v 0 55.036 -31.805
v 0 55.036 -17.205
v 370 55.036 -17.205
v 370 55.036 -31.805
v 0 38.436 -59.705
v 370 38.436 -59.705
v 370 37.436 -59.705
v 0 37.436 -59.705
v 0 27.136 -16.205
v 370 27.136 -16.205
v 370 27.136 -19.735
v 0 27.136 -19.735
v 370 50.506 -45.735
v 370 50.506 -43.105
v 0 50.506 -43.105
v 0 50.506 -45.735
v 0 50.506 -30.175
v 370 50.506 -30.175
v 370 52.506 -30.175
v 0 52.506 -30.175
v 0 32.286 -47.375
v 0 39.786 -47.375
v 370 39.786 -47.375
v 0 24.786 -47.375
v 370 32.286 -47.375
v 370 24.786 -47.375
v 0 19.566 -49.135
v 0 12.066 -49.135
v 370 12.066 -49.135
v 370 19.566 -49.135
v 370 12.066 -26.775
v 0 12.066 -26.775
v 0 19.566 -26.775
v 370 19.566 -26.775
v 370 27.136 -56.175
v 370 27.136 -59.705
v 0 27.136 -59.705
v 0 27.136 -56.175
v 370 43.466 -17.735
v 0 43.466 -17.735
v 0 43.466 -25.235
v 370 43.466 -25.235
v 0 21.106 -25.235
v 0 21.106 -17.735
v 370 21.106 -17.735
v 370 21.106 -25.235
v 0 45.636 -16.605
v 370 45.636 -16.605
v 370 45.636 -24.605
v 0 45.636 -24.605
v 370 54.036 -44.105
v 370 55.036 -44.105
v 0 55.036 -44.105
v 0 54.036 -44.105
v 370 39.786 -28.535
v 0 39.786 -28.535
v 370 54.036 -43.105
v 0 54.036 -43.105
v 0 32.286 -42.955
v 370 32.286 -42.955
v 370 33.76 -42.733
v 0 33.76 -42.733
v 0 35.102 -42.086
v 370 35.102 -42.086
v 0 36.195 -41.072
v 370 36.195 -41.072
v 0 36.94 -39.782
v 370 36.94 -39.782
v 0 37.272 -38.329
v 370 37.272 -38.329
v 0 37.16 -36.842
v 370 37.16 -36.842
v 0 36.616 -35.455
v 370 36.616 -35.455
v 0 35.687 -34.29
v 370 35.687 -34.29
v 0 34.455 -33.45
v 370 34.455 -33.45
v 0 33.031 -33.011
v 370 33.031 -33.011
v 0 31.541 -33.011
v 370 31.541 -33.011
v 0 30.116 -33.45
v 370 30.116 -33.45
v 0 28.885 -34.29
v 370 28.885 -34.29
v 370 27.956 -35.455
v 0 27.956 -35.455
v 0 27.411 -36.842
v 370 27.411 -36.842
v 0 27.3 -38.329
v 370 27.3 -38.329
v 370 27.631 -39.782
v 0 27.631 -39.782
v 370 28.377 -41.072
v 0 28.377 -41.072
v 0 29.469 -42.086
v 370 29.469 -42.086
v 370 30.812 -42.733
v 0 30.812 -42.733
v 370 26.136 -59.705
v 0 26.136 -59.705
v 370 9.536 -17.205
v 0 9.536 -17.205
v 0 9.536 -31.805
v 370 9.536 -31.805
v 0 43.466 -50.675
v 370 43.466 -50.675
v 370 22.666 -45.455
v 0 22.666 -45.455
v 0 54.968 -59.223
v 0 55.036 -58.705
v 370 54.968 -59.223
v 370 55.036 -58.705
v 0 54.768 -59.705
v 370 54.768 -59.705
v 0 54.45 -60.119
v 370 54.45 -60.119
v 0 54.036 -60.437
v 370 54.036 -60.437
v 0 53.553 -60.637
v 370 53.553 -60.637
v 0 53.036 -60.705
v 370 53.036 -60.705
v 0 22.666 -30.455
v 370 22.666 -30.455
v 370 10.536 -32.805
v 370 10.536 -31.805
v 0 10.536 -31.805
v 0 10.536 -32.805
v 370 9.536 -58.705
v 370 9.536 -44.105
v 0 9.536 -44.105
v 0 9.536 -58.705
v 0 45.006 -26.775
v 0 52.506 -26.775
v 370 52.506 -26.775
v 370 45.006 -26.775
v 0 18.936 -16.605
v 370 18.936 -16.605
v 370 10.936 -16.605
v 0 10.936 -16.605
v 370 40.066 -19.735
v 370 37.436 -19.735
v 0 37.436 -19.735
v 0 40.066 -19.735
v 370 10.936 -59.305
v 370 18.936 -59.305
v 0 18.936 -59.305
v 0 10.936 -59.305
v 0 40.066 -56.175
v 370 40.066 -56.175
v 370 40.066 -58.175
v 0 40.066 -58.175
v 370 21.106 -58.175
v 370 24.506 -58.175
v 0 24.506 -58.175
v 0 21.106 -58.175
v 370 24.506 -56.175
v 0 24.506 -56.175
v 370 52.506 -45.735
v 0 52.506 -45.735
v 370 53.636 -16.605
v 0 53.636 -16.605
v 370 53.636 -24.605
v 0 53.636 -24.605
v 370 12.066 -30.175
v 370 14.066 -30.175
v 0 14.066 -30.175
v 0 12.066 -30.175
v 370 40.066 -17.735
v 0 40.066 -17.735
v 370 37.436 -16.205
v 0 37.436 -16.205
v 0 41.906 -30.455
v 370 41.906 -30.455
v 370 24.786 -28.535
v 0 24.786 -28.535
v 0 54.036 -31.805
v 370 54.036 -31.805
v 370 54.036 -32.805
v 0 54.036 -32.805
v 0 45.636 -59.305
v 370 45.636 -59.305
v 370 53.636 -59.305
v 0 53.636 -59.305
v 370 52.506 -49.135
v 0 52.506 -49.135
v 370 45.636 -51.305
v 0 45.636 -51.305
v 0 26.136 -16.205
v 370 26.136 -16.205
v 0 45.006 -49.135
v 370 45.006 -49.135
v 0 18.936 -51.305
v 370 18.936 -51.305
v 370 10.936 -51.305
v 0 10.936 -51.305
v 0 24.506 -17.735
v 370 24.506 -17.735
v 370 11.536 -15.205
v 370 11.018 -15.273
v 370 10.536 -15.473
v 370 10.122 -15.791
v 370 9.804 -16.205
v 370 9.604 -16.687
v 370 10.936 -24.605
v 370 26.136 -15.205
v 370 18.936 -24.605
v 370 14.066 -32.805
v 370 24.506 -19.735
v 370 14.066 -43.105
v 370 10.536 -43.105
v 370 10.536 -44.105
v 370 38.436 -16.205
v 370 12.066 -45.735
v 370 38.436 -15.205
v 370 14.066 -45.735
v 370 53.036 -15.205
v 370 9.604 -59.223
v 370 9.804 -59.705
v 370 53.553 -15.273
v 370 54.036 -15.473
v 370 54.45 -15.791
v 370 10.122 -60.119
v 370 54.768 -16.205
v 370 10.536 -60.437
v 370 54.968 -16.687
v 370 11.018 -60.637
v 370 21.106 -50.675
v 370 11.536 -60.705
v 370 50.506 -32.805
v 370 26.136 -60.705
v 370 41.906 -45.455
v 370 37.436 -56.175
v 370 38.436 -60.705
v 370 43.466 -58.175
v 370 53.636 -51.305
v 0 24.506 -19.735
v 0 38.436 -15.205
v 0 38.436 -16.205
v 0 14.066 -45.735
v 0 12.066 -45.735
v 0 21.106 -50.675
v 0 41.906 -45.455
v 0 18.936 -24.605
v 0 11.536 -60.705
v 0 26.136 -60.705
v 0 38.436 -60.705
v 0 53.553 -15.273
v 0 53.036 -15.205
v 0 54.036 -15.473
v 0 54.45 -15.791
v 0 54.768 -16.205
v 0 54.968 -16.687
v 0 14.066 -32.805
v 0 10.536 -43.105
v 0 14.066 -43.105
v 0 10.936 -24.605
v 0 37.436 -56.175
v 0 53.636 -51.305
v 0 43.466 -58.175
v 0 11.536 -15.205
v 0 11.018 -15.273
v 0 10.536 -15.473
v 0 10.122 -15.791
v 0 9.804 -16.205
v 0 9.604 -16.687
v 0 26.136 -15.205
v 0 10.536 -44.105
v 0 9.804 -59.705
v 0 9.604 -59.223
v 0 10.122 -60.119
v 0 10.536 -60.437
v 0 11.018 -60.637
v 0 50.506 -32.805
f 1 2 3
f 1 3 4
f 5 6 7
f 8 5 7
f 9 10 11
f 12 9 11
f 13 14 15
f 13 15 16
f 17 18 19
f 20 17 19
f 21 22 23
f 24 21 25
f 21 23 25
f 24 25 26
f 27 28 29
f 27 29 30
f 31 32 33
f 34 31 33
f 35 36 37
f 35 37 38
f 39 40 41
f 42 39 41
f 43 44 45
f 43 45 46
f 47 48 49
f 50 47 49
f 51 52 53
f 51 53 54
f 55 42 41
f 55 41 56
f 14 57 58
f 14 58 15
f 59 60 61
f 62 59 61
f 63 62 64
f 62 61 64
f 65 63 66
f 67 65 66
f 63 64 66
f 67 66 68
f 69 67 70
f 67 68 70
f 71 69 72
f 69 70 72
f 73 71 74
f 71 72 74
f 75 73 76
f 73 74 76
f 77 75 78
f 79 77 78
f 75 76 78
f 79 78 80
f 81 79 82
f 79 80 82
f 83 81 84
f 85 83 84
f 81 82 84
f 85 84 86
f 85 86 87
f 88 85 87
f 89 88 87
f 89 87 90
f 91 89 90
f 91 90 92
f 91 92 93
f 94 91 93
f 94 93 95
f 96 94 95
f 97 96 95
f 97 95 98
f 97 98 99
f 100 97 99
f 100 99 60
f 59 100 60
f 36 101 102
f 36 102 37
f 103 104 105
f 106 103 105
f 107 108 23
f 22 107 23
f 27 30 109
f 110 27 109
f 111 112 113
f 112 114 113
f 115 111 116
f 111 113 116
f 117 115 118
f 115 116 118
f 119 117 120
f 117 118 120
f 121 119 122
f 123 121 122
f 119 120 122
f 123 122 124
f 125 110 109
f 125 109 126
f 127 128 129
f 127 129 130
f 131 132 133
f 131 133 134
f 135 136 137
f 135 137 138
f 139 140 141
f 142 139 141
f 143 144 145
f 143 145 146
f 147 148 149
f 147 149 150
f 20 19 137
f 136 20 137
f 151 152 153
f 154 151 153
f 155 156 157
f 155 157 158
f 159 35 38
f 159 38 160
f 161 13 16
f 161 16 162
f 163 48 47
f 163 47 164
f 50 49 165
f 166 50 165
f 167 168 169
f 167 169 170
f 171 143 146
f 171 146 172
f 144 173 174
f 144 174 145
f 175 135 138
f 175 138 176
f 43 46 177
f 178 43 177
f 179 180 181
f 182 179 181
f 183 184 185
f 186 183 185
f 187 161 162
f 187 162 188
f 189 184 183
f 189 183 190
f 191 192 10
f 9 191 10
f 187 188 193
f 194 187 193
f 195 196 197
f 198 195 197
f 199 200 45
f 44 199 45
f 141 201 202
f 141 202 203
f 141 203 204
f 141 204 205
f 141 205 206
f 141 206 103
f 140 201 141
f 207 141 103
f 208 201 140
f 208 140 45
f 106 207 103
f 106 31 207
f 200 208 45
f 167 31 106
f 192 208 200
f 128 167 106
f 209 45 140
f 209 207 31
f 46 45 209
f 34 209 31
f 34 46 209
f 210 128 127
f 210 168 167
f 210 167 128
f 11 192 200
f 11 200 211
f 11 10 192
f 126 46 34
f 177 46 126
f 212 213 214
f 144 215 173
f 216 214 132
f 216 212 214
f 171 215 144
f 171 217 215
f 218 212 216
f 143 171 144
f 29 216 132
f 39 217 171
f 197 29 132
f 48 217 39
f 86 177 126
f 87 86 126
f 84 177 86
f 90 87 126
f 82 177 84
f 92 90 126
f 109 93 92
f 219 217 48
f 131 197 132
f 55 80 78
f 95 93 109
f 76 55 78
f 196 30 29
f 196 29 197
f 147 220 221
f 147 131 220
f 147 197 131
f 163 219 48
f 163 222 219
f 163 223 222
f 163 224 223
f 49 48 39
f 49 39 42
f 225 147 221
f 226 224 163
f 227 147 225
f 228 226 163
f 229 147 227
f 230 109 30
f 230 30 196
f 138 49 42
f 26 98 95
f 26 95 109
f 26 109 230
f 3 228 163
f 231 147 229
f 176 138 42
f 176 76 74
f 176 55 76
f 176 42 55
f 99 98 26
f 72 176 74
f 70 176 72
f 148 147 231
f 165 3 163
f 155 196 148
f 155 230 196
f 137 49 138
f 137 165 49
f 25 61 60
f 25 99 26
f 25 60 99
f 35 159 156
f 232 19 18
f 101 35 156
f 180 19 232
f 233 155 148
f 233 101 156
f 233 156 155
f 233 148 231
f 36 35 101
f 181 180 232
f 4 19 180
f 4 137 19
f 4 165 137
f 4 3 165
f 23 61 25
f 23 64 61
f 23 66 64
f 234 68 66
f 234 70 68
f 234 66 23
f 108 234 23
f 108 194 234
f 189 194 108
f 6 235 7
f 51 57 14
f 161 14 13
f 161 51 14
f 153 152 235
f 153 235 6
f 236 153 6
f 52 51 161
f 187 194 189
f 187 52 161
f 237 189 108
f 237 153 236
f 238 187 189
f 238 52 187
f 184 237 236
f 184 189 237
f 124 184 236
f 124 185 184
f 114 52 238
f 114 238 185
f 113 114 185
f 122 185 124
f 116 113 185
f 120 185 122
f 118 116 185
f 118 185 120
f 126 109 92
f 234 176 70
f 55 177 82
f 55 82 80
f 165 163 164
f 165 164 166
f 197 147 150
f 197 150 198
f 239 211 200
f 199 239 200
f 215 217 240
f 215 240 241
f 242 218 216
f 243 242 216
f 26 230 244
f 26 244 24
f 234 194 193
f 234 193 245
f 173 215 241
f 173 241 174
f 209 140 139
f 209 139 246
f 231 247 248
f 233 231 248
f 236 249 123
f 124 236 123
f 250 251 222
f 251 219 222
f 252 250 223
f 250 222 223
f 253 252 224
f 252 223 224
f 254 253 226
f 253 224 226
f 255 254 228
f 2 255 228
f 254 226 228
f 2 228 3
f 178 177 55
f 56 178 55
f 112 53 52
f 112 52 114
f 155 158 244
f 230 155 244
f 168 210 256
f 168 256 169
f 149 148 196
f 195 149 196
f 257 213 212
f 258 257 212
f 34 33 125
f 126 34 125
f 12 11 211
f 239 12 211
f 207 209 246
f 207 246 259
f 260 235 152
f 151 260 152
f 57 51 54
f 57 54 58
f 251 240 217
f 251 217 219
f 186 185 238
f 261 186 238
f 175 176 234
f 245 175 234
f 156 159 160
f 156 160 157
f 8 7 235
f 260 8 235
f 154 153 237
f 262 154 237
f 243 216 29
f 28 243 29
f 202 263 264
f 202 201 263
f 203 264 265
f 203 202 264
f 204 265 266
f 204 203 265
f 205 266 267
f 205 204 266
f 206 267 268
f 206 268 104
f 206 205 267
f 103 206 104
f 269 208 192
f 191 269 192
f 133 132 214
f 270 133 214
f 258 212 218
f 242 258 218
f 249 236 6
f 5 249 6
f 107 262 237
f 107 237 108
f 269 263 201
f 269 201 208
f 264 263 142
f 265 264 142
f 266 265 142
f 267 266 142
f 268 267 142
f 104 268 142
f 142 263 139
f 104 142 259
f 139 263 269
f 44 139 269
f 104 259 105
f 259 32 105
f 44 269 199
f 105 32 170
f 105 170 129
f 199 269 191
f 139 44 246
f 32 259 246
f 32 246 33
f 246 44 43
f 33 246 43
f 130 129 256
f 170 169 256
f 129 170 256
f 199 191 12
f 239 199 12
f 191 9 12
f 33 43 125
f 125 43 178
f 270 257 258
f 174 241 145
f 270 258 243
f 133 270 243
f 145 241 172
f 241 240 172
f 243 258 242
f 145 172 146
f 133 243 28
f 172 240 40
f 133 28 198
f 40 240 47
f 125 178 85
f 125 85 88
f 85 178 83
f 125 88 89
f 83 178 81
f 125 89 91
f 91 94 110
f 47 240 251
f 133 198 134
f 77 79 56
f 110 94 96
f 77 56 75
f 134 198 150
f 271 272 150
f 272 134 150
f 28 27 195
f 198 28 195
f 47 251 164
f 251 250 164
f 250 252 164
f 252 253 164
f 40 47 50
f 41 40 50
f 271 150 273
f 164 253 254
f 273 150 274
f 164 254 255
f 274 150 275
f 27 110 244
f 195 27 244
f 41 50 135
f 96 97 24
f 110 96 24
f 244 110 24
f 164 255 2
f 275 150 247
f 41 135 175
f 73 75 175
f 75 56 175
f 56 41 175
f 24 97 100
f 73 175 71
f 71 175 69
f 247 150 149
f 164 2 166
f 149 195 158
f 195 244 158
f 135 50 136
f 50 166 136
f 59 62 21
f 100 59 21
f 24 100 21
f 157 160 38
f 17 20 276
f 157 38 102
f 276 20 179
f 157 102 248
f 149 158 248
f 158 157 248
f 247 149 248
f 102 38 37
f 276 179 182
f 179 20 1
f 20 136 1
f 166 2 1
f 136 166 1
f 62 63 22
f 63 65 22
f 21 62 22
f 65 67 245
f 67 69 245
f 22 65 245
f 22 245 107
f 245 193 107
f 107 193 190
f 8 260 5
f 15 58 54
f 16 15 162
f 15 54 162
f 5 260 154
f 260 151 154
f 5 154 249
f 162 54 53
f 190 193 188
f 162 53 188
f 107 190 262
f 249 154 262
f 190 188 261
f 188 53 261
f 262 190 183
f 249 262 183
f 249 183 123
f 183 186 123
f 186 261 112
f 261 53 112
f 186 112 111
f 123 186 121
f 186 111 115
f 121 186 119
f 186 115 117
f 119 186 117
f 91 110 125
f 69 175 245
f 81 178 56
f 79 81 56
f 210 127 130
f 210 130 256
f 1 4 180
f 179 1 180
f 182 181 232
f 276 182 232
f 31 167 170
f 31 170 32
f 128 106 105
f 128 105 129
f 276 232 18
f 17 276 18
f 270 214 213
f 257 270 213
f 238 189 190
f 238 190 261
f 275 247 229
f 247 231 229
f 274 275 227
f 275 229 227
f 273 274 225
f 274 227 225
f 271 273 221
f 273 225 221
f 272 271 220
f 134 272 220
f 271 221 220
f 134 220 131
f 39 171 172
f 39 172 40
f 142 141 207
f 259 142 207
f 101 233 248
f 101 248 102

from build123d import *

# Parameters (mm, degrees)
SKETCH_1_W               = 45.5
SKETCH_1_H               = 45.5
EXTRUDE_1_DEPTH          = 370
CUT_EXTRUDE_1_REACH      = 380.964
SKETCH_2_W               = 8
SKETCH_2_H               = 8
MIRROR_2_COPY_1_REACH    = 380.964
MIRROR_2_COPY_1_SKETCH_W = 8
MIRROR_2_COPY_1_SKETCH_H = 8
CUT_EXTRUDE_2_REACH      = 380.964
MIRROR_4_COPY_1_REACH    = 380.964
FILLET_1_R               = 2
CUT_EXTRUDE_4_REACH      = 380.964
SKETCH_6_R               = 5


with BuildPart() as part:
    # 草图1 → 凸台-拉伸1 (new body)
    with BuildSketch(Plane(origin=(0, 0, 0), x_dir=(0, 0, -1), z_dir=(1, 0, 0))):
        with Locations((37.954960836, 32.285758607)):
            Rectangle(SKETCH_1_W, SKETCH_1_H)
    extrude(amount=EXTRUDE_1_DEPTH)

    # 草图2 → 切除-拉伸1 (cut, up to next)
    with BuildSketch(Plane(origin=(370, 0, 0), x_dir=(0, 0, -1), z_dir=(1, 0, 0)), mode=Mode.PRIVATE) as cut_extrude_1_sk1:
        Polygon((31.804960836, 55.035758607), (31.804960836, 54.035758607), (32.804960836, 54.035758607), (32.804960836, 50.505758607), (30.174960836, 50.505758607), (30.174960836, 52.505758607), (26.774960836, 52.505758607), (26.774960836, 45.005758607), (30.454960836, 41.905758607), (37.954960836, 41.905758607), (37.954960836, 55.035758607), align=None)
    cut_extrude_1_tool1 = extrude(cut_extrude_1_sk1.sketch, amount=-CUT_EXTRUDE_1_REACH, mode=Mode.PRIVATE) & part.part
    # 草图2 → 切除-拉伸1 (cut, up to next)
    with BuildSketch(Plane(origin=(370, 0, 0), x_dir=(0, 0, -1), z_dir=(1, 0, 0)), mode=Mode.PRIVATE) as cut_extrude_1_sk2:
        with Locations((20.604960836, 49.635758607)):
            Rectangle(SKETCH_2_W, SKETCH_2_H)
    cut_extrude_1_tool2 = extrude(cut_extrude_1_sk2.sketch, amount=-CUT_EXTRUDE_1_REACH, mode=Mode.PRIVATE) & part.part
    cut_extrude_1_1 = cut_extrude_1_tool1.solids().sort_by_distance((370, 47.983788, -32.930174))[0]
    add(cut_extrude_1_1, mode=Mode.SUBTRACT)
    cut_extrude_1_2 = cut_extrude_1_tool2.solids().sort_by_distance((370, 49.635759, -20.604961))[0]
    add(cut_extrude_1_2, mode=Mode.SUBTRACT)
    cut_extrude_1 = cut_extrude_1_1 + cut_extrude_1_2  # 切除-拉伸1 as one shape, for the pattern or mirror that repeats it

    # 镜向1: 切除-拉伸1 across plane
    add(cut_extrude_1.mirror(Plane(origin=(0, 0, -37.954960836), x_dir=(1, 0, 0), z_dir=(0, 0, -1))), mode=Mode.SUBTRACT)

    # 镜向2: 切除-拉伸1 across plane
    add(cut_extrude_1.mirror(Plane(origin=(0, 32.285758607, 0), x_dir=(0, 0, 1), z_dir=(0, -1, 0))), mode=Mode.SUBTRACT)

    # 镜向2 copy 1 sketch → 镜向2 copy 1 (cut, up to next)
    with BuildSketch(Plane(origin=(370, 64.571517214, -75.909921671), x_dir=(0, 0, 1), z_dir=(1, 0, 0)), mode=Mode.PRIVATE) as mirror_2_copy_1_sk1:
        Polygon((31.804960836, 55.035758607), (31.804960836, 54.035758607), (32.804960836, 54.035758607), (32.804960836, 50.505758607), (30.174960836, 50.505758607), (30.174960836, 52.505758607), (26.774960836, 52.505758607), (26.774960836, 45.005758607), (30.454960836, 41.905758607), (37.954960836, 41.905758607), (37.954960836, 55.035758607), align=None)
    mirror_2_copy_1_tool1 = extrude(mirror_2_copy_1_sk1.sketch, amount=-MIRROR_2_COPY_1_REACH, mode=Mode.PRIVATE) & part.part
    # 镜向2 copy 1 sketch → 镜向2 copy 1 (cut, up to next)
    with BuildSketch(Plane(origin=(370, 64.571517214, -75.909921671), x_dir=(0, 0, 1), z_dir=(1, 0, 0)), mode=Mode.PRIVATE) as mirror_2_copy_1_sk2:
        with Locations((20.604960836, 49.635758607)):
            Rectangle(MIRROR_2_COPY_1_SKETCH_W, MIRROR_2_COPY_1_SKETCH_H)
    mirror_2_copy_1_tool2 = extrude(mirror_2_copy_1_sk2.sketch, amount=-MIRROR_2_COPY_1_REACH, mode=Mode.PRIVATE) & part.part
    add(mirror_2_copy_1_tool1.solids().sort_by_distance((370, 16.587729214, -42.979747671))[0], mode=Mode.SUBTRACT)
    add(mirror_2_copy_1_tool2.solids().sort_by_distance((370, 14.935758214, -55.304960671))[0], mode=Mode.SUBTRACT)

    # 草图3 → 切除-拉伸2 (cut, up to next)
    with BuildSketch(Plane(origin=(370, 0, 0), x_dir=(0, 0, -1), z_dir=(1, 0, 0)), mode=Mode.PRIVATE) as cut_extrude_2_sk1:
        Polygon((15.204960836, 38.435758607), (16.204960836, 38.435758607), (16.204960836, 37.435758607), (19.734960836, 37.435758607), (19.734960836, 40.065758607), (17.734960836, 40.065758607), (17.734960836, 43.465758607), (25.234960836, 43.465758607), (28.534960836, 39.785758607), (28.534960836, 32.285758607), (15.204960836, 32.285758607), align=None)
    cut_extrude_2_tool1 = extrude(cut_extrude_2_sk1.sketch, amount=-CUT_EXTRUDE_2_REACH, mode=Mode.PRIVATE) & part.part
    cut_extrude_2 = cut_extrude_2_tool1.solids().sort_by_distance((370, 37.306091, -22.347242))[0]
    add(cut_extrude_2, mode=Mode.SUBTRACT)

    # 镜向3: 切除-拉伸2 across plane
    add(cut_extrude_2.mirror(Plane(origin=(0, 32.285758607, 0), x_dir=(0, 0, 1), z_dir=(0, -1, 0))), mode=Mode.SUBTRACT)

    # 镜向4: 切除-拉伸2 across plane
    add(cut_extrude_2.mirror(Plane(origin=(0, 0, -37.954960836), x_dir=(1, 0, 0), z_dir=(0, 0, -1))), mode=Mode.SUBTRACT)

    # 镜向4 copy 1 sketch → 镜向4 copy 1 (cut, up to next)
    with BuildSketch(Plane(origin=(370, 64.571517214, -75.909921671), x_dir=(0, 0, 1), z_dir=(1, 0, 0)), mode=Mode.PRIVATE) as mirror_4_copy_1_sk1:
        Polygon((15.204960836, 38.435758607), (16.204960836, 38.435758607), (16.204960836, 37.435758607), (19.734960836, 37.435758607), (19.734960836, 40.065758607), (17.734960836, 40.065758607), (17.734960836, 43.465758607), (25.234960836, 43.465758607), (28.534960836, 39.785758607), (28.534960836, 32.285758607), (15.204960836, 32.285758607), align=None)
    mirror_4_copy_1_tool1 = extrude(mirror_4_copy_1_sk1.sketch, amount=-MIRROR_4_COPY_1_REACH, mode=Mode.PRIVATE) & part.part
    add(mirror_4_copy_1_tool1.solids().sort_by_distance((370, 27.265426214, -53.562679671))[0], mode=Mode.SUBTRACT)

    # 圆角1
    fillet_1_edges = [part.edges().sort_by_distance(p)[0] for p in [
        (185, 55.035758607, -15.204960836),
        (185, 55.035758607, -60.704960836),
        (185, 9.535758607, -60.704960836),
        (185, 9.535758607, -15.204960836),
    ]]
    fillet(fillet_1_edges, radius=FILLET_1_R)

    # 草图6 → 切除-拉伸4 (cut, up to next)
    with BuildSketch(Plane(origin=(370, 0, 0), x_dir=(0, 0, -1), z_dir=(1, 0, 0)), mode=Mode.PRIVATE) as cut_extrude_4_sk1:
        with Locations((37.954960836, 32.285758607)):
            Circle(SKETCH_6_R)
    cut_extrude_4_tool1 = extrude(cut_extrude_4_sk1.sketch, amount=-CUT_EXTRUDE_4_REACH, mode=Mode.PRIVATE) & part.part
    add(cut_extrude_4_tool1.solids().sort_by_distance((370, 32.285759, -37.954961))[0], mode=Mode.SUBTRACT)


solid = part.part
